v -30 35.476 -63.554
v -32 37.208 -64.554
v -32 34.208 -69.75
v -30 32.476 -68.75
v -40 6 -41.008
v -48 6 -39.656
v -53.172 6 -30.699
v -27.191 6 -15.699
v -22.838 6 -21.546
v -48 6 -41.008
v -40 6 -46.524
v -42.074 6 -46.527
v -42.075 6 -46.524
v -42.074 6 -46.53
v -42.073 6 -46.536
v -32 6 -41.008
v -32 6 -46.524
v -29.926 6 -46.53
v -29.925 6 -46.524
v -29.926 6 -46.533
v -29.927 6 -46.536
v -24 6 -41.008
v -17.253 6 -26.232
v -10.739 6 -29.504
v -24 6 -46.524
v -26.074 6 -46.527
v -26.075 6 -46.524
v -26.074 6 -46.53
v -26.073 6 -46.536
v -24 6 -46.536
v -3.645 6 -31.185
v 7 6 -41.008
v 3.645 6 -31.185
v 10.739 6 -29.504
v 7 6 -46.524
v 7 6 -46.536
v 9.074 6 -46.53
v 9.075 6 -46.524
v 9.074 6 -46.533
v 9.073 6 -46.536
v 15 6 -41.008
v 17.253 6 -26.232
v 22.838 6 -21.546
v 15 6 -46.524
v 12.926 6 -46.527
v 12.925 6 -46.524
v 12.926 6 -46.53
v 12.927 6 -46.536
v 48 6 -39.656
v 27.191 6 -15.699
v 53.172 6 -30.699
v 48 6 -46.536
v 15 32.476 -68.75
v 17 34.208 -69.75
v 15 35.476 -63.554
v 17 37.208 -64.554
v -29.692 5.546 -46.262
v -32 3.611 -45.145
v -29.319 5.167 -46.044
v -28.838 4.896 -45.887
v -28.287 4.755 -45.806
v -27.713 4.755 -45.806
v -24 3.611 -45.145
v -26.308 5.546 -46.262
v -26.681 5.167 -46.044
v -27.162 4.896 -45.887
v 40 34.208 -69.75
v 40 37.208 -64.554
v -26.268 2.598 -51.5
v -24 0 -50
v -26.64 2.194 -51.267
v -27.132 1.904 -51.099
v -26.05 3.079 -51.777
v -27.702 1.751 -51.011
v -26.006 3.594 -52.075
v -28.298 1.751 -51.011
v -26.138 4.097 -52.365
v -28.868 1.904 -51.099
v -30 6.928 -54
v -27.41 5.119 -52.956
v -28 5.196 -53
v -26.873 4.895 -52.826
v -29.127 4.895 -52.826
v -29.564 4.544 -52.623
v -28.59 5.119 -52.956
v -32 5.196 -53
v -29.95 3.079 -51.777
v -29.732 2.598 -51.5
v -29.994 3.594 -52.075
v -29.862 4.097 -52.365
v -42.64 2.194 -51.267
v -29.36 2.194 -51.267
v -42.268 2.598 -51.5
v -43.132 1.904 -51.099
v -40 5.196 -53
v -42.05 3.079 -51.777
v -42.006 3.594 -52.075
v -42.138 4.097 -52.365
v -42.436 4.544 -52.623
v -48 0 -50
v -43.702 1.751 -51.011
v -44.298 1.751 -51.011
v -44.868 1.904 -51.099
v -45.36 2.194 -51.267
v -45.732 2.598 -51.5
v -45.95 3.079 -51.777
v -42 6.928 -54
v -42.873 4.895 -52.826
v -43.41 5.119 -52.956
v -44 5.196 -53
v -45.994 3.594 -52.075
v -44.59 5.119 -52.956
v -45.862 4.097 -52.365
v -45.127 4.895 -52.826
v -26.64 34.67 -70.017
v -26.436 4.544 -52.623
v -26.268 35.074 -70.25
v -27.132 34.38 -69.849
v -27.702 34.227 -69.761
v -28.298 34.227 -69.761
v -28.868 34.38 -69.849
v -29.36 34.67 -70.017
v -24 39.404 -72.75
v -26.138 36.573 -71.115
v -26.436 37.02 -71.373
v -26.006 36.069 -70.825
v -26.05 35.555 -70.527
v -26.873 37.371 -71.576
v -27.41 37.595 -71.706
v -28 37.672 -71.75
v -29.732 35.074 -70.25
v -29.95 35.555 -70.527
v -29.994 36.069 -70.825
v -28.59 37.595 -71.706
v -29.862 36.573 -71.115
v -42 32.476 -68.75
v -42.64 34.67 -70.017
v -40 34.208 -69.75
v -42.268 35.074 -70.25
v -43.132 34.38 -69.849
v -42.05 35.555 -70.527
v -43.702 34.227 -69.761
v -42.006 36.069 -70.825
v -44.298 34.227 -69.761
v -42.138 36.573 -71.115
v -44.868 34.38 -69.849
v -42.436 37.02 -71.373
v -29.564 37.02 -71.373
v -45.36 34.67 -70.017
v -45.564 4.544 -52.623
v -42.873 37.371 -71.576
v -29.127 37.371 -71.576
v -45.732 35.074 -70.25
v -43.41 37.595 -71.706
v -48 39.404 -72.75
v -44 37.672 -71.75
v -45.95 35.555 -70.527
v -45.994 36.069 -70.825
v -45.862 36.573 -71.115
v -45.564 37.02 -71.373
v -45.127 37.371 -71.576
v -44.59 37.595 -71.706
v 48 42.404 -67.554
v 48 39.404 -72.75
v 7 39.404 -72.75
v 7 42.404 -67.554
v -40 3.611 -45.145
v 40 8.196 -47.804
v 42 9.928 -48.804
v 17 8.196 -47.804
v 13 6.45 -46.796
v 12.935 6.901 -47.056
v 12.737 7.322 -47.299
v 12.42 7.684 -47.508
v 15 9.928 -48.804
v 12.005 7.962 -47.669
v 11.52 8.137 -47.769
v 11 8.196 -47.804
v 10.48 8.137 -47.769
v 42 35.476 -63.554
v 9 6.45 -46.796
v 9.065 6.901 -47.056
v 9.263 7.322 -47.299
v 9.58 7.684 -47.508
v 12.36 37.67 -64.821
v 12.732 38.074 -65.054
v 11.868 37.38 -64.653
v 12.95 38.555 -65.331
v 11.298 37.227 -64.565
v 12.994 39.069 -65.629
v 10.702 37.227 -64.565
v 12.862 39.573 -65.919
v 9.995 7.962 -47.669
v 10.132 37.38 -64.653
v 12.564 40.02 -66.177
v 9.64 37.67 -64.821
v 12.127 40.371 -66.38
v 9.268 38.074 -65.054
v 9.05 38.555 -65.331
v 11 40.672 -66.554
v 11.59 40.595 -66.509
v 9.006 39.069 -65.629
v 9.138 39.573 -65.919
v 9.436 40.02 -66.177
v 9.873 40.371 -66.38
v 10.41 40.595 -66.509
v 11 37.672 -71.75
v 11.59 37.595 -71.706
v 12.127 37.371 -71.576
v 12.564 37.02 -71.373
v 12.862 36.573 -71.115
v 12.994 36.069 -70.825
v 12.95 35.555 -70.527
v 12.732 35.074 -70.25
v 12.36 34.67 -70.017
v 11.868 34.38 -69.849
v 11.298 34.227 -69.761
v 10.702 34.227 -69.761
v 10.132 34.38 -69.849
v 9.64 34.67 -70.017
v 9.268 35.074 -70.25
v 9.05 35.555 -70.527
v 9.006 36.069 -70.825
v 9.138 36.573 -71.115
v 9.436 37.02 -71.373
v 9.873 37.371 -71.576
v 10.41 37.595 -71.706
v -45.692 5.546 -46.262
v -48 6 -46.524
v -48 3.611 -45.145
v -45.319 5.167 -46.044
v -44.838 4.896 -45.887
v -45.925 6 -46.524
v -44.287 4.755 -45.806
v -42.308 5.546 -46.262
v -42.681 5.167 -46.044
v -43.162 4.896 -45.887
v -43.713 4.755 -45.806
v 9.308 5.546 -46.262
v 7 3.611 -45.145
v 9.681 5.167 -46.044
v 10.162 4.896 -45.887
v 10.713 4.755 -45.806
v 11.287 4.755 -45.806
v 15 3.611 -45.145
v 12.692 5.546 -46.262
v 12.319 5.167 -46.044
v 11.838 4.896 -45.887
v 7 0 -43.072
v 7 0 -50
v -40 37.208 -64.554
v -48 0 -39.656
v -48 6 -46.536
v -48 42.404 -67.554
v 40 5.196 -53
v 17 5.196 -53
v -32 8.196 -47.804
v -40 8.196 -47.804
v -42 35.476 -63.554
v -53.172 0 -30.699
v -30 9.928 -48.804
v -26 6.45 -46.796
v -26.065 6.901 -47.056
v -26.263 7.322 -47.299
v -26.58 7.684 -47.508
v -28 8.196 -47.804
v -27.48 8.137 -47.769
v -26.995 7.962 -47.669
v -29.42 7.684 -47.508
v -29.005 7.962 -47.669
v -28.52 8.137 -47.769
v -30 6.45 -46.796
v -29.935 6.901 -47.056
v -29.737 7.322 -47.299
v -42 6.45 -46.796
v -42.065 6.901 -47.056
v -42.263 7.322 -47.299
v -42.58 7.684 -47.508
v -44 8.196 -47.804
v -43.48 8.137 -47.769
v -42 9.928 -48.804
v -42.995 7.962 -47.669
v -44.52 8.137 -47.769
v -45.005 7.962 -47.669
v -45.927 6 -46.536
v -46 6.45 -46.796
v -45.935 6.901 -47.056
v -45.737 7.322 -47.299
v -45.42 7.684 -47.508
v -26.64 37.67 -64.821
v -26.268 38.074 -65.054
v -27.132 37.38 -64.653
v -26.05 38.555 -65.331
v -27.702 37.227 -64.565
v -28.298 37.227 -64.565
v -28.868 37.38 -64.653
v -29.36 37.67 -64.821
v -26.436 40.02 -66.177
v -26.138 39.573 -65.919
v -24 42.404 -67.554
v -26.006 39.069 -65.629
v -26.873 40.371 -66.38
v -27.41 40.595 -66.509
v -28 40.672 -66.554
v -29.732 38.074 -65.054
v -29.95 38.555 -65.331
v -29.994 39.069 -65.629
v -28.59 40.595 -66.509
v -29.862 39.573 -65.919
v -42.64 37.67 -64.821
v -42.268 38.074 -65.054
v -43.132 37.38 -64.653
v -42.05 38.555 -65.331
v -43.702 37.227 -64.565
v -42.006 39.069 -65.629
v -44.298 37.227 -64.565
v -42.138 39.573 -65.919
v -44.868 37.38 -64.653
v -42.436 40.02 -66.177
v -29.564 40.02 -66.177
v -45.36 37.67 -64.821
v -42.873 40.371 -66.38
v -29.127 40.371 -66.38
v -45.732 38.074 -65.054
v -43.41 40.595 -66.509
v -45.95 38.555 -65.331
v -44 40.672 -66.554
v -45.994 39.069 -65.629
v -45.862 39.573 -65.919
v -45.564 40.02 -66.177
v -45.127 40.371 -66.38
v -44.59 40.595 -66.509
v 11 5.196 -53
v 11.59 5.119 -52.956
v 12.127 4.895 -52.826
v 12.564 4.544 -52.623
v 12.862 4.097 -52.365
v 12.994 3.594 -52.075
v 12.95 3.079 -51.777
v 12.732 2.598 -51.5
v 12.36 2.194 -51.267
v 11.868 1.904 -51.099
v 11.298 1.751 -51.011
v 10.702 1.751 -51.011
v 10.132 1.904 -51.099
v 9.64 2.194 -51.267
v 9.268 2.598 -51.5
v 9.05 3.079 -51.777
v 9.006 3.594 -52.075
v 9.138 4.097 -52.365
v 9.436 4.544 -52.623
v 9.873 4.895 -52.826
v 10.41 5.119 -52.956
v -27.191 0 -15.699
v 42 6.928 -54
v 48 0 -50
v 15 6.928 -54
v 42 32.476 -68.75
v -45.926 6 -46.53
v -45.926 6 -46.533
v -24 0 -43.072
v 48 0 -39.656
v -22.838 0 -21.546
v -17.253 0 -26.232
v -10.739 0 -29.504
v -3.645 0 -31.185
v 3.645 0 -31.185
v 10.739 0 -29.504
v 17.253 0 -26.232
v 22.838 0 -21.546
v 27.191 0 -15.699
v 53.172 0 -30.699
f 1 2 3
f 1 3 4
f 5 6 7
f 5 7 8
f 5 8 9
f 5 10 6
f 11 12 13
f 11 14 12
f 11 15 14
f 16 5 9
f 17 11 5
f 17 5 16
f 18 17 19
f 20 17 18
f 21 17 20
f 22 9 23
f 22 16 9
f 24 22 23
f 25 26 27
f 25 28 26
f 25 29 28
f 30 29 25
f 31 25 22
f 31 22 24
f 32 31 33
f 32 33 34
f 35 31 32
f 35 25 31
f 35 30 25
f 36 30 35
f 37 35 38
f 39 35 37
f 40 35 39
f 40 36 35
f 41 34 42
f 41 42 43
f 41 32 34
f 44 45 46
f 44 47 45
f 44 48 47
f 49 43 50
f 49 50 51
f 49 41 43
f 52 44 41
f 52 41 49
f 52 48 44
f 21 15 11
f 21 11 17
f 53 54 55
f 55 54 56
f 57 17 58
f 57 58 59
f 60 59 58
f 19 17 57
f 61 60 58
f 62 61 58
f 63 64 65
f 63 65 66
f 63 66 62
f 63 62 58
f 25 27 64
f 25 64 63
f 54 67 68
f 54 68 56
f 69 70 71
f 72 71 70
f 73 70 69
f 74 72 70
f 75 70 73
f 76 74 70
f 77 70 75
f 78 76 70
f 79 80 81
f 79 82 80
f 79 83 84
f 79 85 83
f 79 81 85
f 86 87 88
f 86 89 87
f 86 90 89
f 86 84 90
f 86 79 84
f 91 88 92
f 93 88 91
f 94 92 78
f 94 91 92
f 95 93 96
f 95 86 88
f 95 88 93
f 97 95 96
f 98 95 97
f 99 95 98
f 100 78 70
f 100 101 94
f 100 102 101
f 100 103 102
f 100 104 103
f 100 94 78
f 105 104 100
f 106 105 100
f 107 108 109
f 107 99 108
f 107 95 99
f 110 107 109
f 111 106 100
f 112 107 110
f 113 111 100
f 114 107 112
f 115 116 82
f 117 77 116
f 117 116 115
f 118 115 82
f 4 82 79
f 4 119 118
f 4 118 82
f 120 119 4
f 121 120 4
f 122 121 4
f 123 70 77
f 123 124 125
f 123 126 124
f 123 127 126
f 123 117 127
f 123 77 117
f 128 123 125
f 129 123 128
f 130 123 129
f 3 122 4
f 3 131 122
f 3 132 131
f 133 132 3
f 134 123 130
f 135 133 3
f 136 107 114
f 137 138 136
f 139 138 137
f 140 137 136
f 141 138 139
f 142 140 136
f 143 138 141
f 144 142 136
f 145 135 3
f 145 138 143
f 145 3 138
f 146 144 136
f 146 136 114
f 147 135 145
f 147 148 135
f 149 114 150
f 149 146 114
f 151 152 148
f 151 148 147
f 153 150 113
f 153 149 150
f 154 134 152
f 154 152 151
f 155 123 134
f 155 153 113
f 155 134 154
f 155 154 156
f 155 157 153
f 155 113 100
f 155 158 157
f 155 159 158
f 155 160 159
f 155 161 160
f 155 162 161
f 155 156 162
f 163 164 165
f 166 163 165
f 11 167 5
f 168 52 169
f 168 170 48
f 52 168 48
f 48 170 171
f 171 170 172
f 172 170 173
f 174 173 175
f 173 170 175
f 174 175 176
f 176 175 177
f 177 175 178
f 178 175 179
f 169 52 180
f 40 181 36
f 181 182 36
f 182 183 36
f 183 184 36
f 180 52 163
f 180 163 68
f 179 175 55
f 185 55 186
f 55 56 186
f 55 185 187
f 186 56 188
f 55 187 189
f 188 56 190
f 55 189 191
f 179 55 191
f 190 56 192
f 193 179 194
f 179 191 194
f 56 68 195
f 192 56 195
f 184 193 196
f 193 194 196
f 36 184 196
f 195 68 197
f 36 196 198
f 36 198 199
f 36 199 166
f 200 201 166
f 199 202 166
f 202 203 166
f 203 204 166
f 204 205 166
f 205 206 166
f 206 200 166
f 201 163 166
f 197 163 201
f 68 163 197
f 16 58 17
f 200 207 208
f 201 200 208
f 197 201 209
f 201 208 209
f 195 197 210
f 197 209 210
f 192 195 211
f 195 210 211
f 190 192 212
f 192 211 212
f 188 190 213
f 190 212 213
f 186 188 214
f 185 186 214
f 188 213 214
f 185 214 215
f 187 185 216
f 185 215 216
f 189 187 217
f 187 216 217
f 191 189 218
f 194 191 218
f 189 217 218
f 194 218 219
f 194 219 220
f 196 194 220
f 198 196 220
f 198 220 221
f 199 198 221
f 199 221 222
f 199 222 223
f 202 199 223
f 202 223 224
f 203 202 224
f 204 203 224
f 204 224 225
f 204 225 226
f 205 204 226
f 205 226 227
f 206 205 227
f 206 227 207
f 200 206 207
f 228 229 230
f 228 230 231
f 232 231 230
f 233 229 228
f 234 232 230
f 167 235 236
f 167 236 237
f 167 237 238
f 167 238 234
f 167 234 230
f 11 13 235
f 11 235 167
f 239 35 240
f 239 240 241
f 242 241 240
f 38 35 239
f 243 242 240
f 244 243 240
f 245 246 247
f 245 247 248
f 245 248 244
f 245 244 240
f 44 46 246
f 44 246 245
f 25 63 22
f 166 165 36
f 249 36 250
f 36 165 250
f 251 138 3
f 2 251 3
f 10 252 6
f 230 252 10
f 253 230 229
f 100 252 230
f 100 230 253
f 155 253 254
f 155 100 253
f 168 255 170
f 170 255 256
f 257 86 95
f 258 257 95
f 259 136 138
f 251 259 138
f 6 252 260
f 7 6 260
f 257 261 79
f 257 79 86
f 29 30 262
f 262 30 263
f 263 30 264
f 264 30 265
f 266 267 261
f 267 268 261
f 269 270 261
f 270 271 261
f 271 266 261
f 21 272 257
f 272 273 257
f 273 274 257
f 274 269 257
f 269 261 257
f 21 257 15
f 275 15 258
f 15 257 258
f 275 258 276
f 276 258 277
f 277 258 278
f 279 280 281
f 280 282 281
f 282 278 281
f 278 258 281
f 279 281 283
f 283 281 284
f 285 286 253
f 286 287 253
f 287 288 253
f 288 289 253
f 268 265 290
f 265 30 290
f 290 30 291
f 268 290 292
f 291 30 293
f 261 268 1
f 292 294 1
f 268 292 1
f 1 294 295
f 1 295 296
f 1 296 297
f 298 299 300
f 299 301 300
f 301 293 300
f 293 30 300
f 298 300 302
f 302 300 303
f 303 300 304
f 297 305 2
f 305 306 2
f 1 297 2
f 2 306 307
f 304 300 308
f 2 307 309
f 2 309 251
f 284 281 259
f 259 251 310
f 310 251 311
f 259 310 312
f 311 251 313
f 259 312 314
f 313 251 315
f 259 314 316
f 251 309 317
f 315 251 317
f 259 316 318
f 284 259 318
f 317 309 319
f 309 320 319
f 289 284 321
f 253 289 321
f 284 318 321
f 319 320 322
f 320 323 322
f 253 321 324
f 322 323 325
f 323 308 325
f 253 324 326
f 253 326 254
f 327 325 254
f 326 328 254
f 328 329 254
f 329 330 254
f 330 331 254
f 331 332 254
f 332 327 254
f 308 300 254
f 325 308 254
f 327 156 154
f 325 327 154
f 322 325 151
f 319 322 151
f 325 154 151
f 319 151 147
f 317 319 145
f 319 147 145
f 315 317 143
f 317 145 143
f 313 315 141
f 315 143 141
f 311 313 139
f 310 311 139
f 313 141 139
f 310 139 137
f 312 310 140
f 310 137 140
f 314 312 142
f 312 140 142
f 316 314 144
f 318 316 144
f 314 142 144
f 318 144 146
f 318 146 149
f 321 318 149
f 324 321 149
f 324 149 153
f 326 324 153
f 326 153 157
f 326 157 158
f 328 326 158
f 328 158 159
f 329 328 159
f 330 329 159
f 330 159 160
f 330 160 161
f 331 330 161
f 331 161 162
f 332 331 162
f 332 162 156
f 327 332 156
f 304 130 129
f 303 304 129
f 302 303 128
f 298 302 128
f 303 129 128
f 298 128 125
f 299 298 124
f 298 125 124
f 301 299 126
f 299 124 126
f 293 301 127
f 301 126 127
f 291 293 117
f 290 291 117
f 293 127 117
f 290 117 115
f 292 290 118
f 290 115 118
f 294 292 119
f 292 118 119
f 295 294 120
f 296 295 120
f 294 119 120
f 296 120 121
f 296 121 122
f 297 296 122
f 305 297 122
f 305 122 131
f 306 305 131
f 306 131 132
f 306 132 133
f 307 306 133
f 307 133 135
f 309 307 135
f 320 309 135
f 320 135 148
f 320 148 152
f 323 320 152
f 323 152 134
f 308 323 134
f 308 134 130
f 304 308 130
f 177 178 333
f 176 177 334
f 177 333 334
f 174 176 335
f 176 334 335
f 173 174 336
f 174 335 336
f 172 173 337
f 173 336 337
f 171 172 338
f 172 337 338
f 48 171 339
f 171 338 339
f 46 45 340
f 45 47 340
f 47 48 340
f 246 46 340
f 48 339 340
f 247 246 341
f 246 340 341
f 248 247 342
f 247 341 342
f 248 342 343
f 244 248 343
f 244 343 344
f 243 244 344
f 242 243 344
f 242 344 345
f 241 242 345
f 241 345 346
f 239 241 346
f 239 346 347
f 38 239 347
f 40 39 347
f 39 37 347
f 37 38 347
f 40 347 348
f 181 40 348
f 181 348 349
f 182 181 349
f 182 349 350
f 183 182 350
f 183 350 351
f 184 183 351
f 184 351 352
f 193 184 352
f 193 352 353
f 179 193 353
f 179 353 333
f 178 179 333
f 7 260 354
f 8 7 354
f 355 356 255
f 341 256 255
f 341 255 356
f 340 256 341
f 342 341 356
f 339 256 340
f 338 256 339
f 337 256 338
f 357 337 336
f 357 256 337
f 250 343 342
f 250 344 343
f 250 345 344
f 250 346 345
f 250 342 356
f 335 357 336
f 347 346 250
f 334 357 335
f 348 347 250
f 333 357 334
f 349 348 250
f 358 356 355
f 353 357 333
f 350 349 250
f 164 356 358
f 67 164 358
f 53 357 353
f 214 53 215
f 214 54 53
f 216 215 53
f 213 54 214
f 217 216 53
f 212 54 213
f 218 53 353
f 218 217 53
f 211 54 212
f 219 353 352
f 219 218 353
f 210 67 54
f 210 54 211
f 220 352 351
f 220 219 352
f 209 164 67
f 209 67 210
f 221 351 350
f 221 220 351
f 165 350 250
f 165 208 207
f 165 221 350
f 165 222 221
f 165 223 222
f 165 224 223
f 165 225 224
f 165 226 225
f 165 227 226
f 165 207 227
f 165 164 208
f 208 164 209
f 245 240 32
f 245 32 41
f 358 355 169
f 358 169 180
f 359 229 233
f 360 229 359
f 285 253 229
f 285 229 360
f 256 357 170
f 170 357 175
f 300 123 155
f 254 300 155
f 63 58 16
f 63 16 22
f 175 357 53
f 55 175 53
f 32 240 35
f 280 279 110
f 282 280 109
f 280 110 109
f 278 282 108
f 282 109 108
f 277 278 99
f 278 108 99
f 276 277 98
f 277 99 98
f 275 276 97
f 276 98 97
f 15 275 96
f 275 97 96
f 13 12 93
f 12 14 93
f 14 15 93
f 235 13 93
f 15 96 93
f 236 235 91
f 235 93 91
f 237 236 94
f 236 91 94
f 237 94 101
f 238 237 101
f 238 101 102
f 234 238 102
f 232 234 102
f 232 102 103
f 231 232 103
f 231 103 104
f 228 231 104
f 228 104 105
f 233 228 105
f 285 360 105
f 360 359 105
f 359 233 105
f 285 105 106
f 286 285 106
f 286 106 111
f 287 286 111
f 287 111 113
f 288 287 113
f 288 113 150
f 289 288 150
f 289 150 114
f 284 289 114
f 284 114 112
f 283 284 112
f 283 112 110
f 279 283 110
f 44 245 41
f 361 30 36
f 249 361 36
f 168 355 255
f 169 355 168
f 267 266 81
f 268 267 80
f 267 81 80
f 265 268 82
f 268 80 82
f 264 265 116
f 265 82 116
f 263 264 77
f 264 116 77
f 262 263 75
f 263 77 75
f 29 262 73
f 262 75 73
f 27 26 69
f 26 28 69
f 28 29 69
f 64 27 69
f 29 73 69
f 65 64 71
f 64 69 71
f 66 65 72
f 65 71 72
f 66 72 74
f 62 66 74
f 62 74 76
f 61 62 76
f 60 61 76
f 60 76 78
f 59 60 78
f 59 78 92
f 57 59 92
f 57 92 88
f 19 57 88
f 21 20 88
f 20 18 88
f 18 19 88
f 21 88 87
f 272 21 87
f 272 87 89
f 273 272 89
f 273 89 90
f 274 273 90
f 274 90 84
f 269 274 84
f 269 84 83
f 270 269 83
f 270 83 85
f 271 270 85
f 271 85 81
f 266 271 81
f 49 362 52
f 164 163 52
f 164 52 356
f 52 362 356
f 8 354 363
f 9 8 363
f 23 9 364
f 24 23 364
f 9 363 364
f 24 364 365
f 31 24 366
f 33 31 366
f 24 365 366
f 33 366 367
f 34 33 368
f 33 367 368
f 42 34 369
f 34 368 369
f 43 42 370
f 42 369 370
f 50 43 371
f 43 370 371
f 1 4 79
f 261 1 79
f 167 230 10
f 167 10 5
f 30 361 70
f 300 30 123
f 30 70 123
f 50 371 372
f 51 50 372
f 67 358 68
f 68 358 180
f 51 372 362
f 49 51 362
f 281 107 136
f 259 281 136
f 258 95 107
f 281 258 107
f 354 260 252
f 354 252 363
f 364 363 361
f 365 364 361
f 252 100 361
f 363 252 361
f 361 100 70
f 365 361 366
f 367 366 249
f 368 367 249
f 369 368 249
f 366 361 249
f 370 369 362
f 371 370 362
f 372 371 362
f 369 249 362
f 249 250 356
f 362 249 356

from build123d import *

# Parameters (mm, degrees)
BOSS_EXTRUDE1_DEPTH = 6
SKETCH3_W           = 96
SKETCH3_H           = 45.5
BOSS_EXTRUDE2_DEPTH = 6
CUT_EXTRUDE1_DEPTH  = 6
CUT_EXTRUDE2_DEPTH  = 91.403621508
SKETCH9_W           = 27
SKETCH9_H           = 33.5
CUT_EXTRUDE3_DEPTH  = 91.403621508
CHAMFER1_SIZE       = 2
SKETCH11_R          = 2
CUT_EXTRUDE4_DEPTH  = 91.403621508
CUT_EXTRUDE6_START  = 0.01
SKETCH12_W          = 8
SKETCH12_H          = 6.6
CUT_EXTRUDE6_DEPTH  = 91.493120288


with BuildPart() as part:
    # Sketch2 → Boss-Extrude1 (new body)
    with BuildSketch(Plane(origin=(0, 0, 0), x_dir=(1, 0, 0), z_dir=(0, 1, 0))):
        with BuildLine():
            Line((27.190997647, 15.698729811), (53.17175976, 30.698729811))
            Line((53.17175976, 30.698729811), (48, 39.65648048))
            Line((48, 39.65648048), (48, 50))
            Line((48, 50), (-48, 50))
            Line((-48, 50), (-48, 39.65648048))
            Line((-48, 39.65648048), (-53.17175976, 30.698729811))
            Line((-53.17175976, 30.698729811), (-27.190997647, 15.698729811))
            ThreePointArc((-27.190997647, 15.698729811), (0, 31.397459622), (27.190997647, 15.698729811))
        make_face()
    extrude(amount=BOSS_EXTRUDE1_DEPTH)

    # Sketch3 → Boss-Extrude2 (add)
    with BuildSketch(Plane(origin=(0, -21.650635095, -37.5), x_dir=(-1, 0, 0), z_dir=(0, -0.500000000000001, -0.866025403784438))):
        with Locations((0, 47.75)):
            Rectangle(SKETCH3_W, SKETCH3_H)
    extrude(amount=-BOSS_EXTRUDE2_DEPTH)

    # Sketch4 → Cut-Extrude1 (cut)
    with BuildSketch(Plane(origin=(0, -21.650635095, -37.5), x_dir=(-1, 0, 0), z_dir=(0, -0.5000000000000009, -0.8660254037844383))):
        Polygon((24, 70.5), (24, 25), (24, 15), (-7, 15), (-7, 25), (-7, 70.5), align=None)
    extrude(amount=-CUT_EXTRUDE1_DEPTH, mode=Mode.SUBTRACT)

    # Sketch8 → Cut-Extrude2 (cut, through all)
    with BuildSketch(Plane(origin=(0, -21.650635095, -37.5), x_dir=(-1, 0, 0), z_dir=(0, -0.500000000000001, -0.8660254037844382))):
        Polygon((32, 64.5), (30, 62.5), (30, 33), (32, 31), (40, 31), (42, 33), (42, 62.5), (40, 64.5), align=None)
    extrude(amount=-CUT_EXTRUDE2_DEPTH, mode=Mode.SUBTRACT)

    # Sketch9 → Cut-Extrude3 (cut, through all)
    with BuildSketch(Plane(origin=(0, -21.650635095, -37.5), x_dir=(-1, 0, 0), z_dir=(0, -0.500000000000001, -0.8660254037844382))):
        with Locations((-28.5, 47.75)):
            Rectangle(SKETCH9_W, SKETCH9_H)
    extrude(amount=-CUT_EXTRUDE3_DEPTH, mode=Mode.SUBTRACT)

    # Chamfer1
    chamfer1_edges = [part.edges().sort_by_distance(p)[0] for p in [
        (42, 6.696152423, -50.401923789),
        (15, 6.696152423, -50.401923789),
        (15, 35.708003449, -67.151923789),
        (42, 35.708003449, -67.151923789),
    ]]
    chamfer(chamfer1_edges, length=CHAMFER1_SIZE)

    # Sketch11 → Cut-Extrude4 (cut, through all)
    with BuildSketch(Plane(origin=(0, -21.650635095, -37.5), x_dir=(-1, 0, 0), z_dir=(0, -0.500000000000001, -0.8660254037844382))):
        with Locations((28, 66.5)):
            Circle(SKETCH11_R)
        with Locations((44, 66.5)):
            Circle(SKETCH11_R)
        with Locations((-11, 66.5)):
            Circle(SKETCH11_R)
        with Locations((28, 29)):
            Circle(SKETCH11_R)
        with Locations((44, 29)):
            Circle(SKETCH11_R)
        with Locations((-11, 29)):
            Circle(SKETCH11_R)
    extrude(amount=-CUT_EXTRUDE4_DEPTH, mode=Mode.SUBTRACT)

    # Sketch12 → Cut-Extrude6 (cut, through all)
    with BuildSketch(Plane(origin=(0, -18.650635095, -32.303847577), x_dir=(1, 0, 0), z_dir=(0, 0.500000000000001, 0.8660254037844382)).offset(CUT_EXTRUDE6_START)):
        with Locations((11, 29)):
            Rectangle(SKETCH12_W, SKETCH12_H)
        with Locations((-28, 29)):
            Rectangle(SKETCH12_W, SKETCH12_H)
        with Locations((-44, 29)):
            Rectangle(SKETCH12_W, SKETCH12_H)
    extrude(amount=CUT_EXTRUDE6_DEPTH, mode=Mode.SUBTRACT)


solid = part.part
